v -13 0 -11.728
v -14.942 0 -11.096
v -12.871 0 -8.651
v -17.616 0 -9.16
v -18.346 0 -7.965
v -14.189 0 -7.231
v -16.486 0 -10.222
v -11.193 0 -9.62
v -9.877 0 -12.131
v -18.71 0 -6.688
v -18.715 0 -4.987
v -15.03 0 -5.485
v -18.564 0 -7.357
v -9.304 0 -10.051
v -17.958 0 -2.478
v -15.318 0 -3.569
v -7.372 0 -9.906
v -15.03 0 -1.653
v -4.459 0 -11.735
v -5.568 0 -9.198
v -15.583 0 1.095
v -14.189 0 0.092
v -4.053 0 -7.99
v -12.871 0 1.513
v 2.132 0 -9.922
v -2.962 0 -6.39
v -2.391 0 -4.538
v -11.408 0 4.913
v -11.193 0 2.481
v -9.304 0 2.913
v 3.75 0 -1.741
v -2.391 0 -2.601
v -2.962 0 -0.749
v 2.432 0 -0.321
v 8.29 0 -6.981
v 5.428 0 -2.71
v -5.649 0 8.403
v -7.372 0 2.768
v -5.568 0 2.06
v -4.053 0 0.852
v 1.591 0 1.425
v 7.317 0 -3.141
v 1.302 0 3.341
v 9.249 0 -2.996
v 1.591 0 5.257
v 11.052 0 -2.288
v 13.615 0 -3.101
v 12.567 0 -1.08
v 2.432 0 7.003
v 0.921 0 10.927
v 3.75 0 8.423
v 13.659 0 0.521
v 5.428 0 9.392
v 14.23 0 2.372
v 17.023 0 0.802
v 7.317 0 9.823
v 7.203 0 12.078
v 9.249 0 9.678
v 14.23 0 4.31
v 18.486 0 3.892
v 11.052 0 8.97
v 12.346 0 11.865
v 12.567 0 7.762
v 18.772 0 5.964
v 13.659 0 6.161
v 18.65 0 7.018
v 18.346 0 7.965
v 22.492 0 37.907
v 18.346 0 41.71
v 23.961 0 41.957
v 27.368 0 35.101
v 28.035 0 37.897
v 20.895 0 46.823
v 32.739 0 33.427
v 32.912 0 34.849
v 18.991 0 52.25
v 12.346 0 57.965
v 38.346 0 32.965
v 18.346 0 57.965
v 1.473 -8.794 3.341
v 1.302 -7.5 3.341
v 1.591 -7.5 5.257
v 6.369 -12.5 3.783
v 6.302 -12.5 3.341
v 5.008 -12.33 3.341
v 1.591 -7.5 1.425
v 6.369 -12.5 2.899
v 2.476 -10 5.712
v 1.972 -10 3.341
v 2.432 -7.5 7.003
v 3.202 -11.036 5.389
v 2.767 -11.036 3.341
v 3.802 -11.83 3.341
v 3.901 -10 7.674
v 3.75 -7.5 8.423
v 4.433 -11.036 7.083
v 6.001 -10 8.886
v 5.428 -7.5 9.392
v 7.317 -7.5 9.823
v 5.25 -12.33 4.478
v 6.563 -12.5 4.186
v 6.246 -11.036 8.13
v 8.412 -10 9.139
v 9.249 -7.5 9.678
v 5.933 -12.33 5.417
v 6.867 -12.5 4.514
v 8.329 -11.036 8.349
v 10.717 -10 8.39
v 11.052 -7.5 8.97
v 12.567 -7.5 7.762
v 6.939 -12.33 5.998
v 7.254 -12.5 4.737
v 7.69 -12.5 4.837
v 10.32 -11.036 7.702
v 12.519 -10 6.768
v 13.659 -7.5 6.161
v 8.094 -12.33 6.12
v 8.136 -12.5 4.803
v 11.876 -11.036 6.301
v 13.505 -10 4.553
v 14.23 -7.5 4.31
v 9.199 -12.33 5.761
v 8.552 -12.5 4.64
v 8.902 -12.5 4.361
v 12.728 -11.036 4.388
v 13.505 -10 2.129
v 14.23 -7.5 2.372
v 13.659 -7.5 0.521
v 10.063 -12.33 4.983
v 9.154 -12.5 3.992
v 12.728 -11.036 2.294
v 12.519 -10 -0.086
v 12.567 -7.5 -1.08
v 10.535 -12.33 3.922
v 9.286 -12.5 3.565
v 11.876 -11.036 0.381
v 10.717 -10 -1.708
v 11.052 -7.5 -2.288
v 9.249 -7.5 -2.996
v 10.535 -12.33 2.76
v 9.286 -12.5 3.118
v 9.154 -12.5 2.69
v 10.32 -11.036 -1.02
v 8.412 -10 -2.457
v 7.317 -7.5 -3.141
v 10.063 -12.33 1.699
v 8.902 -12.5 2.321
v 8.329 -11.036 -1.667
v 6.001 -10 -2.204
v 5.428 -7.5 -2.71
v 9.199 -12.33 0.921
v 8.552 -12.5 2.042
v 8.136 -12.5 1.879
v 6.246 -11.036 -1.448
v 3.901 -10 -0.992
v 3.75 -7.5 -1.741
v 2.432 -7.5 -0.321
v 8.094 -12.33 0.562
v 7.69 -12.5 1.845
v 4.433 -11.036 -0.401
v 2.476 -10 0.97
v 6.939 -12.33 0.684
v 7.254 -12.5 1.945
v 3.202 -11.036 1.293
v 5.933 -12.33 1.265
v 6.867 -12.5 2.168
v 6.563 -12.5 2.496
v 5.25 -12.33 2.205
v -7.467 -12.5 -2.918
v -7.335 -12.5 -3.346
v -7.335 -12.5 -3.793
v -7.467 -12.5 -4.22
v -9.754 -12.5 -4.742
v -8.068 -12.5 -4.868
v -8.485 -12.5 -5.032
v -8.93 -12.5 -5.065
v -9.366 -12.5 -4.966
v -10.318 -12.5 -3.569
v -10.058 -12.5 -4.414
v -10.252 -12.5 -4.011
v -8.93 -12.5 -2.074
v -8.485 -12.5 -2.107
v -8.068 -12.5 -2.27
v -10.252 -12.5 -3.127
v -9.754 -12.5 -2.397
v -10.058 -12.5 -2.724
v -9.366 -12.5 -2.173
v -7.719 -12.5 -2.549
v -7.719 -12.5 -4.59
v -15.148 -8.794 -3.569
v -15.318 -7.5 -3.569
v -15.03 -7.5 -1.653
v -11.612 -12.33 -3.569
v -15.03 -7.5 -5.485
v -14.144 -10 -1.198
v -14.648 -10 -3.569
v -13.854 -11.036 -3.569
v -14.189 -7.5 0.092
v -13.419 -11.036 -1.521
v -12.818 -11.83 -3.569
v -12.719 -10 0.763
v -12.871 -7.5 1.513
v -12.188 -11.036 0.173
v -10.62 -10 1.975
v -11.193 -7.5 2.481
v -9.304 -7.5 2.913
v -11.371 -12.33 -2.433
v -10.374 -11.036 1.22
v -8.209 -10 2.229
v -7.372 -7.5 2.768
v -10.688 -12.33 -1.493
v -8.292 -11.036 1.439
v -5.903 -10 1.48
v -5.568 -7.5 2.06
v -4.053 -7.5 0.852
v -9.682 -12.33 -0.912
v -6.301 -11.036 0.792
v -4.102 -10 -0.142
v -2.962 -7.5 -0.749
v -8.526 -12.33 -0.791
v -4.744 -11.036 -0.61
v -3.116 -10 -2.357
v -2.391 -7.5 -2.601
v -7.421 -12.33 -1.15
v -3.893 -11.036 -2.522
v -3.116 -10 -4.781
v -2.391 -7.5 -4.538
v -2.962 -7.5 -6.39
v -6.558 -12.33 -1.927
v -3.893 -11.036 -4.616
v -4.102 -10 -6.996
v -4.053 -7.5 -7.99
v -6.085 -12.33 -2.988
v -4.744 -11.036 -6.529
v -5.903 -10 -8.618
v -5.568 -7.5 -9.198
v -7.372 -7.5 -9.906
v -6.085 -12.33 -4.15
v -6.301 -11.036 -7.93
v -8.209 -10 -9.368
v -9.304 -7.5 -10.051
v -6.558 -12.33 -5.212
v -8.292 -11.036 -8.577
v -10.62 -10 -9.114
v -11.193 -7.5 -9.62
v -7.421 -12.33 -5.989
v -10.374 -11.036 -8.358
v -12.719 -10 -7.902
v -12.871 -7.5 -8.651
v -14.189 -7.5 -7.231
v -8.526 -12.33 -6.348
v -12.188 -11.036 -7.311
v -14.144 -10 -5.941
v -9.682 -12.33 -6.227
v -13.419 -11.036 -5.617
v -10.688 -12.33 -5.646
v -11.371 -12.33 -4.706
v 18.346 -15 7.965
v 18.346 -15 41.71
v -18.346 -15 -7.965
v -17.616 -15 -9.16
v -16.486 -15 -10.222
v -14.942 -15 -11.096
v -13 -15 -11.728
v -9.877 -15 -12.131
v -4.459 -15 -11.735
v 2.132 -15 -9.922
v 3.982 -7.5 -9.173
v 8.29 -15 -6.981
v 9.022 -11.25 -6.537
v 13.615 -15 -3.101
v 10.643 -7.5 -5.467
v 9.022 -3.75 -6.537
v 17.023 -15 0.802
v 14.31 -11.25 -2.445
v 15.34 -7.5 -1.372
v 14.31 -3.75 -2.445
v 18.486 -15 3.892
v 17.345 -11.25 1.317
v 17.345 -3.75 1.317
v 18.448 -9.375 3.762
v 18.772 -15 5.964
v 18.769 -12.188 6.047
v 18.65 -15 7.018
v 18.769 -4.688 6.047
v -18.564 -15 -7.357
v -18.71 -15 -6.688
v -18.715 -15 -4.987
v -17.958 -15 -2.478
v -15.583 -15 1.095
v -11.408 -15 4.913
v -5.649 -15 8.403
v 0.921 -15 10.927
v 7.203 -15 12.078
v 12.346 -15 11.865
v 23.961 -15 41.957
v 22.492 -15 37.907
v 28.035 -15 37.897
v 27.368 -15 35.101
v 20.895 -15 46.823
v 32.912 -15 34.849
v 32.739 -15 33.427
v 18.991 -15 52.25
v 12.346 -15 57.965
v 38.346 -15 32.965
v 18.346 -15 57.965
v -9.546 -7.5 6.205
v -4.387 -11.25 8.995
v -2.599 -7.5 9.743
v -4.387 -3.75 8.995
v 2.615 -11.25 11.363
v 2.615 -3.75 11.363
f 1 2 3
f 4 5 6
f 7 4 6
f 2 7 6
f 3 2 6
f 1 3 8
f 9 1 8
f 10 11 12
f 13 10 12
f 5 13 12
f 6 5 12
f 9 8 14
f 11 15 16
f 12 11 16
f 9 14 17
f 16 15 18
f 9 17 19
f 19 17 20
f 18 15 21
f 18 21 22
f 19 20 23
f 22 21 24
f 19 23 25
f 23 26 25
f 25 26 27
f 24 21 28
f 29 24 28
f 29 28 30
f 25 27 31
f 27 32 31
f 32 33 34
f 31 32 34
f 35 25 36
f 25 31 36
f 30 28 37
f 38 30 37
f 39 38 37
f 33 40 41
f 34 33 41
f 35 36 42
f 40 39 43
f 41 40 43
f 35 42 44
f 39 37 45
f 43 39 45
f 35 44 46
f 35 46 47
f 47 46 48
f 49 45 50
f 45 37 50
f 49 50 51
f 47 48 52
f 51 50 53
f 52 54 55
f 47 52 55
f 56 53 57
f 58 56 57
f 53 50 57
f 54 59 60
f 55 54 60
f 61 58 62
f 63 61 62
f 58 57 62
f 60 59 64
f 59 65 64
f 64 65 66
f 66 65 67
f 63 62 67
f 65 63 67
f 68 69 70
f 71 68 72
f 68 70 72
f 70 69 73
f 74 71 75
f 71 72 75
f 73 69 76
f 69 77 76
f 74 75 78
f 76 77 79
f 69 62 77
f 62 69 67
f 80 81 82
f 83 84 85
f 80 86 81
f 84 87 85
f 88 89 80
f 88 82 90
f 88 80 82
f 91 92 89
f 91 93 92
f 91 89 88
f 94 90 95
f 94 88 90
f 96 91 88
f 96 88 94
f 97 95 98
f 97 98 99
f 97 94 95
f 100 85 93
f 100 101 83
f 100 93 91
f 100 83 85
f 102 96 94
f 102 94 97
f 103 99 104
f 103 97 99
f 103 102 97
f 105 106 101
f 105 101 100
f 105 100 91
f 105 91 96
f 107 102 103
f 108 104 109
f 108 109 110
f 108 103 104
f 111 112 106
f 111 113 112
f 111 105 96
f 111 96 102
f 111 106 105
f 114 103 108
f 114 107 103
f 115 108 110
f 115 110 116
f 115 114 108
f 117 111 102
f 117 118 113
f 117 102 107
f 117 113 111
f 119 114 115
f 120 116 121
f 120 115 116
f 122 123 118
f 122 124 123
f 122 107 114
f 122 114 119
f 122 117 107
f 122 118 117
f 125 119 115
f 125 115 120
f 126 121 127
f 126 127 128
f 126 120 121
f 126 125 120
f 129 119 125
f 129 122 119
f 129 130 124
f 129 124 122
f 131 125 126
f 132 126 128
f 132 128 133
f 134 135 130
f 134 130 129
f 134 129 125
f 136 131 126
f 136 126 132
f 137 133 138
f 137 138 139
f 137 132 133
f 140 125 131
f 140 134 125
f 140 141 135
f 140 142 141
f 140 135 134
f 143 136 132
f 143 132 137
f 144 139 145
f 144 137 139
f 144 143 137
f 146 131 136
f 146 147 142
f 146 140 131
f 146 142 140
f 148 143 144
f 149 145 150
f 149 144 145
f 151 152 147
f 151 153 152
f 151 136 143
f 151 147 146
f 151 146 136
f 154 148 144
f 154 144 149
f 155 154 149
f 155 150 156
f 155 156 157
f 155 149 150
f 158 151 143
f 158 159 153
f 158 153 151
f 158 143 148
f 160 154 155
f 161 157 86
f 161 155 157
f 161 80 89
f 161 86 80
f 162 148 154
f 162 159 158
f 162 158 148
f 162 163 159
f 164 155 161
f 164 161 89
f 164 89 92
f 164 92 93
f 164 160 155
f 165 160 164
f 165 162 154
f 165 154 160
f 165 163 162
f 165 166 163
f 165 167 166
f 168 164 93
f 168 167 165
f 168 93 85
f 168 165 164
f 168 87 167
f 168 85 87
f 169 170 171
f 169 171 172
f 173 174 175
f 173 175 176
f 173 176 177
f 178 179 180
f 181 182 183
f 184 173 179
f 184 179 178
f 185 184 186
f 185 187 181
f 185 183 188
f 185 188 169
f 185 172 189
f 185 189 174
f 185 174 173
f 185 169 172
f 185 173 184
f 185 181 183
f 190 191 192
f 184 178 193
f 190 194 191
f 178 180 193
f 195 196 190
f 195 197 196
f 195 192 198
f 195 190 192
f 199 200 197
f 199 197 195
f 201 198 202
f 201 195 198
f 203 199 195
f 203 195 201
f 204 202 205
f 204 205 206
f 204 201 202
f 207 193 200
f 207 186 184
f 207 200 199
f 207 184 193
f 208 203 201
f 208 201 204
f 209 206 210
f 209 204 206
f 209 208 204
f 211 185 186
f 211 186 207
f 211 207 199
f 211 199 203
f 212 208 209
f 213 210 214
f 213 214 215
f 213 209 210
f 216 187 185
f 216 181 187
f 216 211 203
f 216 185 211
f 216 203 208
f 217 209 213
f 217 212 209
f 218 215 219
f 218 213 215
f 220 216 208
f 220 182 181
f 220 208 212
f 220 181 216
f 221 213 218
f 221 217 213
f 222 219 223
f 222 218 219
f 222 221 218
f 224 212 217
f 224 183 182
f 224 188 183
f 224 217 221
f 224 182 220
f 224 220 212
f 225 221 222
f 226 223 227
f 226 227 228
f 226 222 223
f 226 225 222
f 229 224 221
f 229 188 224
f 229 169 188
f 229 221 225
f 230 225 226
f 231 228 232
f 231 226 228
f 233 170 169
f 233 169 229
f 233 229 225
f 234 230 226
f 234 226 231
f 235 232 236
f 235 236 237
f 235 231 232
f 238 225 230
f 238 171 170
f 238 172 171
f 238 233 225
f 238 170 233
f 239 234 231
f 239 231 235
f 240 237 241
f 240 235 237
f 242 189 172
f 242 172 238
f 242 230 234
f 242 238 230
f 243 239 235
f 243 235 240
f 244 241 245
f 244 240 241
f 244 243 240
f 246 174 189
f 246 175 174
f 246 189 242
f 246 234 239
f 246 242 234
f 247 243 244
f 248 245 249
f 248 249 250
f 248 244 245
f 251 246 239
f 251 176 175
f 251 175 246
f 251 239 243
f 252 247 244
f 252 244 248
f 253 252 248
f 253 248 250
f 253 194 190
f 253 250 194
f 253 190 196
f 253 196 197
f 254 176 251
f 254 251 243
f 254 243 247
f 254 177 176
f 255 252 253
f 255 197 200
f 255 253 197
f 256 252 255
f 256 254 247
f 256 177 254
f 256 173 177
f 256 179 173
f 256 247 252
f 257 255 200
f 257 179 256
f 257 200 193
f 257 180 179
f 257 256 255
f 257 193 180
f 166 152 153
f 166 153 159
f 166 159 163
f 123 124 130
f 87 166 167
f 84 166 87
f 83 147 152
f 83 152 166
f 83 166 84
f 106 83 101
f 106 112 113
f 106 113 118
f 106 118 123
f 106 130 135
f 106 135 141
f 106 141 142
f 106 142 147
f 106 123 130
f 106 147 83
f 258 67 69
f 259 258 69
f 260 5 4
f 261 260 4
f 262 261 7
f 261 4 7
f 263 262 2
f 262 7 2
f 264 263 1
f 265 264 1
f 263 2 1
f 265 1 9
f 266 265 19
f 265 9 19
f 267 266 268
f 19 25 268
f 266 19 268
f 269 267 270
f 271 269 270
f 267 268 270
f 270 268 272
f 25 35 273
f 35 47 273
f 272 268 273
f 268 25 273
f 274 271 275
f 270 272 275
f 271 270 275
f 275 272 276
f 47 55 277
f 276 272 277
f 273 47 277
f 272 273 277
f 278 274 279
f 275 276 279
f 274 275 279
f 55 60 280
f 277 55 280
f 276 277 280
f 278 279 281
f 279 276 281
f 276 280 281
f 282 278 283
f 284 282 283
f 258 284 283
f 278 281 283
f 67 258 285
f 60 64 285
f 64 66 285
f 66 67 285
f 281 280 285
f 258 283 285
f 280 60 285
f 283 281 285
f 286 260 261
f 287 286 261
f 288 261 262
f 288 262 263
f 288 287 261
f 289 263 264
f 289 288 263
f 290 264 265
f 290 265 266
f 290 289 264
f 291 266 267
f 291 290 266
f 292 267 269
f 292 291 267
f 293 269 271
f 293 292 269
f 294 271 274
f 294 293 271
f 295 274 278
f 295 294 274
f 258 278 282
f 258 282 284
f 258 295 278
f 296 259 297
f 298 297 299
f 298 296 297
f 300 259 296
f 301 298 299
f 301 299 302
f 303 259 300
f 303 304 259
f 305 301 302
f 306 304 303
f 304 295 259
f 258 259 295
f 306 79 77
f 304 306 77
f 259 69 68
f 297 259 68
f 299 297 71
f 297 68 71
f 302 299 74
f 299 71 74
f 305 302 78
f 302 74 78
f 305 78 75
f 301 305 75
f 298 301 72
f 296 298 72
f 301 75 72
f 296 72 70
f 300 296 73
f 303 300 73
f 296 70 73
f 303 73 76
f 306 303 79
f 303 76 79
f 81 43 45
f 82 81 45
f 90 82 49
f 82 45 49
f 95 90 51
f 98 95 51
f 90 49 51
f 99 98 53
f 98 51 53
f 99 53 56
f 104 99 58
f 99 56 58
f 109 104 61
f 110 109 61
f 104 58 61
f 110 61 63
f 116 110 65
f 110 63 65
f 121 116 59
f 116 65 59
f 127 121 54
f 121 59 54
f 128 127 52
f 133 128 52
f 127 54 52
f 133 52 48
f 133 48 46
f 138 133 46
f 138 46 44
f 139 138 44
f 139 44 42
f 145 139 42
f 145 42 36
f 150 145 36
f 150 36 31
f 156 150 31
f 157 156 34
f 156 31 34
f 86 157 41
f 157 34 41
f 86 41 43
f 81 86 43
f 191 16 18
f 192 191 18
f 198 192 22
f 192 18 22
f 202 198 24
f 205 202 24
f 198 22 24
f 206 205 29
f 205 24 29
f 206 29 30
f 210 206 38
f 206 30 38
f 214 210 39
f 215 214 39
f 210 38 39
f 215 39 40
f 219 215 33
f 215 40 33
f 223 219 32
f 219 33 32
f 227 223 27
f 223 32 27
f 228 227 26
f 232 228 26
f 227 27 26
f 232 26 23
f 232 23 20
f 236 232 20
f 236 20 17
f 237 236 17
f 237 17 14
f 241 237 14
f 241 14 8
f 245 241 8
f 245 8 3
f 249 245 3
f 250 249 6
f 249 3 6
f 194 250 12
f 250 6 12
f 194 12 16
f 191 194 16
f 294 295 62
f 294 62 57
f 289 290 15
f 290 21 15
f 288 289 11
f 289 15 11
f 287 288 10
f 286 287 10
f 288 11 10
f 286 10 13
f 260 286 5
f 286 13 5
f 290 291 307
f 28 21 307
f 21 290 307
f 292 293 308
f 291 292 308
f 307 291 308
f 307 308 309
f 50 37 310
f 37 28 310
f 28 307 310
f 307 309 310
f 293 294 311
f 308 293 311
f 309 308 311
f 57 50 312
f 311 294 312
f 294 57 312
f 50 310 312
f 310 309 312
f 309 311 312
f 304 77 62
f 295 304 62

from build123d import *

# Parameters (mm, degrees)
F1_DEPTH = 15
F2_DEPTH = 15
F4_R     = 6.5
F5_DEPTH = 12.5
F6_R     = 5


with BuildPart() as f1:
    # F0 (on Front) → F1 (new body)
    with BuildSketch(Plane.XZ):
        with BuildLine():
            add(Edge.make_bspline(
                [(12.345655, 11.864802), (-30.375552, 19.744474), (-18.345655, -7.96473)],
                knots=[3.780961, 3.780961, 3.780961, 6.283185, 6.283185, 6.283185], degree=2, weights=[1, 0.314267, 1]))
            add(Edge.make_bspline(
                [(-18.345655, -7.96473), (-14.36329, -17.137558), (3.982365, -9.172828), (22.328021, -1.208097), (18.345655, 7.96473)],
                knots=[0, 0, 0, 1.570796, 1.570796, 3.141593, 3.141593, 3.141593], degree=2, weights=[1, 0.707107, 1, 0.707107, 1]))
            Line((18.345655, 7.96473), (12.345655, 7.96473))
            Line((12.345655, 7.96473), (12.345655, 11.864802))
        make_face()
        with BuildLine():
            Line((12.345655, 7.96473), (18.345655, 7.96473))
            add(Edge.make_bspline(
                [(18.345655, 7.96473), (17.027337, 11.001294), (12.345655, 11.864802)],
                knots=[3.141593, 3.141593, 3.141593, 3.780961, 3.780961, 3.780961], degree=2, weights=[1, 0.949335, 1]))
            Line((12.345655, 11.864802), (12.345655, 7.96473))
        make_face()
        with BuildLine():
            add(Edge.make_bspline(
                [(18.345655, 7.96473), (17.027337, 11.001294), (12.345655, 11.864802)],
                knots=[3.141593, 3.141593, 3.141593, 3.780961, 3.780961, 3.780961], degree=2, weights=[1, 0.949335, 1]))
            Line((18.345655, 7.96473), (18.345655, 41.709554))
            Line((18.345655, 41.709554), (18.345655, 57.96473))
            Line((18.345655, 57.96473), (12.345655, 57.96473))
            Line((12.345655, 57.96473), (12.345655, 11.864802))
        make_face()
    extrude(amount=F1_DEPTH)


with BuildPart() as f2:
    # F0 (on Front) → F2 (new body)
    with BuildSketch(Plane.XZ):
        with BuildLine():
            Line((18.345655, 57.96473), (18.345655, 41.709554))
            ThreePointArc((18.345655, 41.709554), (27.367957, 35.101079), (38.345655, 32.96473))
            ThreePointArc((38.345655, 32.96473), (23.960892, 41.95692), (18.345655, 57.96473))
        make_face()
    extrude(amount=F2_DEPTH)


with BuildPart() as f1_1:
    add(f1.part)

    # F3: union F2
    add(f2.part)

    # F4 (on face) → F5 (cut)
    with BuildSketch(Plane(origin=(0, 0, 0), x_dir=(-1, 0, 0), z_dir=(0, 1, 0))):
        with Locations((-7.80234, 3.341065)):
            Circle(F4_R)
        with Locations((8.818329, -3.569316)):
            Circle(F4_R)
    extrude(amount=-F5_DEPTH, mode=Mode.SUBTRACT)

    # F6
    f6_edges = [f1_1.edges().sort_by_distance(p)[0] for p in [
        (-2.318329, -12.5, -3.569316),
        (14.30234, -12.5, 3.341065),
    ]]
    fillet(f6_edges, radius=F6_R)


solid = f1_1.part
